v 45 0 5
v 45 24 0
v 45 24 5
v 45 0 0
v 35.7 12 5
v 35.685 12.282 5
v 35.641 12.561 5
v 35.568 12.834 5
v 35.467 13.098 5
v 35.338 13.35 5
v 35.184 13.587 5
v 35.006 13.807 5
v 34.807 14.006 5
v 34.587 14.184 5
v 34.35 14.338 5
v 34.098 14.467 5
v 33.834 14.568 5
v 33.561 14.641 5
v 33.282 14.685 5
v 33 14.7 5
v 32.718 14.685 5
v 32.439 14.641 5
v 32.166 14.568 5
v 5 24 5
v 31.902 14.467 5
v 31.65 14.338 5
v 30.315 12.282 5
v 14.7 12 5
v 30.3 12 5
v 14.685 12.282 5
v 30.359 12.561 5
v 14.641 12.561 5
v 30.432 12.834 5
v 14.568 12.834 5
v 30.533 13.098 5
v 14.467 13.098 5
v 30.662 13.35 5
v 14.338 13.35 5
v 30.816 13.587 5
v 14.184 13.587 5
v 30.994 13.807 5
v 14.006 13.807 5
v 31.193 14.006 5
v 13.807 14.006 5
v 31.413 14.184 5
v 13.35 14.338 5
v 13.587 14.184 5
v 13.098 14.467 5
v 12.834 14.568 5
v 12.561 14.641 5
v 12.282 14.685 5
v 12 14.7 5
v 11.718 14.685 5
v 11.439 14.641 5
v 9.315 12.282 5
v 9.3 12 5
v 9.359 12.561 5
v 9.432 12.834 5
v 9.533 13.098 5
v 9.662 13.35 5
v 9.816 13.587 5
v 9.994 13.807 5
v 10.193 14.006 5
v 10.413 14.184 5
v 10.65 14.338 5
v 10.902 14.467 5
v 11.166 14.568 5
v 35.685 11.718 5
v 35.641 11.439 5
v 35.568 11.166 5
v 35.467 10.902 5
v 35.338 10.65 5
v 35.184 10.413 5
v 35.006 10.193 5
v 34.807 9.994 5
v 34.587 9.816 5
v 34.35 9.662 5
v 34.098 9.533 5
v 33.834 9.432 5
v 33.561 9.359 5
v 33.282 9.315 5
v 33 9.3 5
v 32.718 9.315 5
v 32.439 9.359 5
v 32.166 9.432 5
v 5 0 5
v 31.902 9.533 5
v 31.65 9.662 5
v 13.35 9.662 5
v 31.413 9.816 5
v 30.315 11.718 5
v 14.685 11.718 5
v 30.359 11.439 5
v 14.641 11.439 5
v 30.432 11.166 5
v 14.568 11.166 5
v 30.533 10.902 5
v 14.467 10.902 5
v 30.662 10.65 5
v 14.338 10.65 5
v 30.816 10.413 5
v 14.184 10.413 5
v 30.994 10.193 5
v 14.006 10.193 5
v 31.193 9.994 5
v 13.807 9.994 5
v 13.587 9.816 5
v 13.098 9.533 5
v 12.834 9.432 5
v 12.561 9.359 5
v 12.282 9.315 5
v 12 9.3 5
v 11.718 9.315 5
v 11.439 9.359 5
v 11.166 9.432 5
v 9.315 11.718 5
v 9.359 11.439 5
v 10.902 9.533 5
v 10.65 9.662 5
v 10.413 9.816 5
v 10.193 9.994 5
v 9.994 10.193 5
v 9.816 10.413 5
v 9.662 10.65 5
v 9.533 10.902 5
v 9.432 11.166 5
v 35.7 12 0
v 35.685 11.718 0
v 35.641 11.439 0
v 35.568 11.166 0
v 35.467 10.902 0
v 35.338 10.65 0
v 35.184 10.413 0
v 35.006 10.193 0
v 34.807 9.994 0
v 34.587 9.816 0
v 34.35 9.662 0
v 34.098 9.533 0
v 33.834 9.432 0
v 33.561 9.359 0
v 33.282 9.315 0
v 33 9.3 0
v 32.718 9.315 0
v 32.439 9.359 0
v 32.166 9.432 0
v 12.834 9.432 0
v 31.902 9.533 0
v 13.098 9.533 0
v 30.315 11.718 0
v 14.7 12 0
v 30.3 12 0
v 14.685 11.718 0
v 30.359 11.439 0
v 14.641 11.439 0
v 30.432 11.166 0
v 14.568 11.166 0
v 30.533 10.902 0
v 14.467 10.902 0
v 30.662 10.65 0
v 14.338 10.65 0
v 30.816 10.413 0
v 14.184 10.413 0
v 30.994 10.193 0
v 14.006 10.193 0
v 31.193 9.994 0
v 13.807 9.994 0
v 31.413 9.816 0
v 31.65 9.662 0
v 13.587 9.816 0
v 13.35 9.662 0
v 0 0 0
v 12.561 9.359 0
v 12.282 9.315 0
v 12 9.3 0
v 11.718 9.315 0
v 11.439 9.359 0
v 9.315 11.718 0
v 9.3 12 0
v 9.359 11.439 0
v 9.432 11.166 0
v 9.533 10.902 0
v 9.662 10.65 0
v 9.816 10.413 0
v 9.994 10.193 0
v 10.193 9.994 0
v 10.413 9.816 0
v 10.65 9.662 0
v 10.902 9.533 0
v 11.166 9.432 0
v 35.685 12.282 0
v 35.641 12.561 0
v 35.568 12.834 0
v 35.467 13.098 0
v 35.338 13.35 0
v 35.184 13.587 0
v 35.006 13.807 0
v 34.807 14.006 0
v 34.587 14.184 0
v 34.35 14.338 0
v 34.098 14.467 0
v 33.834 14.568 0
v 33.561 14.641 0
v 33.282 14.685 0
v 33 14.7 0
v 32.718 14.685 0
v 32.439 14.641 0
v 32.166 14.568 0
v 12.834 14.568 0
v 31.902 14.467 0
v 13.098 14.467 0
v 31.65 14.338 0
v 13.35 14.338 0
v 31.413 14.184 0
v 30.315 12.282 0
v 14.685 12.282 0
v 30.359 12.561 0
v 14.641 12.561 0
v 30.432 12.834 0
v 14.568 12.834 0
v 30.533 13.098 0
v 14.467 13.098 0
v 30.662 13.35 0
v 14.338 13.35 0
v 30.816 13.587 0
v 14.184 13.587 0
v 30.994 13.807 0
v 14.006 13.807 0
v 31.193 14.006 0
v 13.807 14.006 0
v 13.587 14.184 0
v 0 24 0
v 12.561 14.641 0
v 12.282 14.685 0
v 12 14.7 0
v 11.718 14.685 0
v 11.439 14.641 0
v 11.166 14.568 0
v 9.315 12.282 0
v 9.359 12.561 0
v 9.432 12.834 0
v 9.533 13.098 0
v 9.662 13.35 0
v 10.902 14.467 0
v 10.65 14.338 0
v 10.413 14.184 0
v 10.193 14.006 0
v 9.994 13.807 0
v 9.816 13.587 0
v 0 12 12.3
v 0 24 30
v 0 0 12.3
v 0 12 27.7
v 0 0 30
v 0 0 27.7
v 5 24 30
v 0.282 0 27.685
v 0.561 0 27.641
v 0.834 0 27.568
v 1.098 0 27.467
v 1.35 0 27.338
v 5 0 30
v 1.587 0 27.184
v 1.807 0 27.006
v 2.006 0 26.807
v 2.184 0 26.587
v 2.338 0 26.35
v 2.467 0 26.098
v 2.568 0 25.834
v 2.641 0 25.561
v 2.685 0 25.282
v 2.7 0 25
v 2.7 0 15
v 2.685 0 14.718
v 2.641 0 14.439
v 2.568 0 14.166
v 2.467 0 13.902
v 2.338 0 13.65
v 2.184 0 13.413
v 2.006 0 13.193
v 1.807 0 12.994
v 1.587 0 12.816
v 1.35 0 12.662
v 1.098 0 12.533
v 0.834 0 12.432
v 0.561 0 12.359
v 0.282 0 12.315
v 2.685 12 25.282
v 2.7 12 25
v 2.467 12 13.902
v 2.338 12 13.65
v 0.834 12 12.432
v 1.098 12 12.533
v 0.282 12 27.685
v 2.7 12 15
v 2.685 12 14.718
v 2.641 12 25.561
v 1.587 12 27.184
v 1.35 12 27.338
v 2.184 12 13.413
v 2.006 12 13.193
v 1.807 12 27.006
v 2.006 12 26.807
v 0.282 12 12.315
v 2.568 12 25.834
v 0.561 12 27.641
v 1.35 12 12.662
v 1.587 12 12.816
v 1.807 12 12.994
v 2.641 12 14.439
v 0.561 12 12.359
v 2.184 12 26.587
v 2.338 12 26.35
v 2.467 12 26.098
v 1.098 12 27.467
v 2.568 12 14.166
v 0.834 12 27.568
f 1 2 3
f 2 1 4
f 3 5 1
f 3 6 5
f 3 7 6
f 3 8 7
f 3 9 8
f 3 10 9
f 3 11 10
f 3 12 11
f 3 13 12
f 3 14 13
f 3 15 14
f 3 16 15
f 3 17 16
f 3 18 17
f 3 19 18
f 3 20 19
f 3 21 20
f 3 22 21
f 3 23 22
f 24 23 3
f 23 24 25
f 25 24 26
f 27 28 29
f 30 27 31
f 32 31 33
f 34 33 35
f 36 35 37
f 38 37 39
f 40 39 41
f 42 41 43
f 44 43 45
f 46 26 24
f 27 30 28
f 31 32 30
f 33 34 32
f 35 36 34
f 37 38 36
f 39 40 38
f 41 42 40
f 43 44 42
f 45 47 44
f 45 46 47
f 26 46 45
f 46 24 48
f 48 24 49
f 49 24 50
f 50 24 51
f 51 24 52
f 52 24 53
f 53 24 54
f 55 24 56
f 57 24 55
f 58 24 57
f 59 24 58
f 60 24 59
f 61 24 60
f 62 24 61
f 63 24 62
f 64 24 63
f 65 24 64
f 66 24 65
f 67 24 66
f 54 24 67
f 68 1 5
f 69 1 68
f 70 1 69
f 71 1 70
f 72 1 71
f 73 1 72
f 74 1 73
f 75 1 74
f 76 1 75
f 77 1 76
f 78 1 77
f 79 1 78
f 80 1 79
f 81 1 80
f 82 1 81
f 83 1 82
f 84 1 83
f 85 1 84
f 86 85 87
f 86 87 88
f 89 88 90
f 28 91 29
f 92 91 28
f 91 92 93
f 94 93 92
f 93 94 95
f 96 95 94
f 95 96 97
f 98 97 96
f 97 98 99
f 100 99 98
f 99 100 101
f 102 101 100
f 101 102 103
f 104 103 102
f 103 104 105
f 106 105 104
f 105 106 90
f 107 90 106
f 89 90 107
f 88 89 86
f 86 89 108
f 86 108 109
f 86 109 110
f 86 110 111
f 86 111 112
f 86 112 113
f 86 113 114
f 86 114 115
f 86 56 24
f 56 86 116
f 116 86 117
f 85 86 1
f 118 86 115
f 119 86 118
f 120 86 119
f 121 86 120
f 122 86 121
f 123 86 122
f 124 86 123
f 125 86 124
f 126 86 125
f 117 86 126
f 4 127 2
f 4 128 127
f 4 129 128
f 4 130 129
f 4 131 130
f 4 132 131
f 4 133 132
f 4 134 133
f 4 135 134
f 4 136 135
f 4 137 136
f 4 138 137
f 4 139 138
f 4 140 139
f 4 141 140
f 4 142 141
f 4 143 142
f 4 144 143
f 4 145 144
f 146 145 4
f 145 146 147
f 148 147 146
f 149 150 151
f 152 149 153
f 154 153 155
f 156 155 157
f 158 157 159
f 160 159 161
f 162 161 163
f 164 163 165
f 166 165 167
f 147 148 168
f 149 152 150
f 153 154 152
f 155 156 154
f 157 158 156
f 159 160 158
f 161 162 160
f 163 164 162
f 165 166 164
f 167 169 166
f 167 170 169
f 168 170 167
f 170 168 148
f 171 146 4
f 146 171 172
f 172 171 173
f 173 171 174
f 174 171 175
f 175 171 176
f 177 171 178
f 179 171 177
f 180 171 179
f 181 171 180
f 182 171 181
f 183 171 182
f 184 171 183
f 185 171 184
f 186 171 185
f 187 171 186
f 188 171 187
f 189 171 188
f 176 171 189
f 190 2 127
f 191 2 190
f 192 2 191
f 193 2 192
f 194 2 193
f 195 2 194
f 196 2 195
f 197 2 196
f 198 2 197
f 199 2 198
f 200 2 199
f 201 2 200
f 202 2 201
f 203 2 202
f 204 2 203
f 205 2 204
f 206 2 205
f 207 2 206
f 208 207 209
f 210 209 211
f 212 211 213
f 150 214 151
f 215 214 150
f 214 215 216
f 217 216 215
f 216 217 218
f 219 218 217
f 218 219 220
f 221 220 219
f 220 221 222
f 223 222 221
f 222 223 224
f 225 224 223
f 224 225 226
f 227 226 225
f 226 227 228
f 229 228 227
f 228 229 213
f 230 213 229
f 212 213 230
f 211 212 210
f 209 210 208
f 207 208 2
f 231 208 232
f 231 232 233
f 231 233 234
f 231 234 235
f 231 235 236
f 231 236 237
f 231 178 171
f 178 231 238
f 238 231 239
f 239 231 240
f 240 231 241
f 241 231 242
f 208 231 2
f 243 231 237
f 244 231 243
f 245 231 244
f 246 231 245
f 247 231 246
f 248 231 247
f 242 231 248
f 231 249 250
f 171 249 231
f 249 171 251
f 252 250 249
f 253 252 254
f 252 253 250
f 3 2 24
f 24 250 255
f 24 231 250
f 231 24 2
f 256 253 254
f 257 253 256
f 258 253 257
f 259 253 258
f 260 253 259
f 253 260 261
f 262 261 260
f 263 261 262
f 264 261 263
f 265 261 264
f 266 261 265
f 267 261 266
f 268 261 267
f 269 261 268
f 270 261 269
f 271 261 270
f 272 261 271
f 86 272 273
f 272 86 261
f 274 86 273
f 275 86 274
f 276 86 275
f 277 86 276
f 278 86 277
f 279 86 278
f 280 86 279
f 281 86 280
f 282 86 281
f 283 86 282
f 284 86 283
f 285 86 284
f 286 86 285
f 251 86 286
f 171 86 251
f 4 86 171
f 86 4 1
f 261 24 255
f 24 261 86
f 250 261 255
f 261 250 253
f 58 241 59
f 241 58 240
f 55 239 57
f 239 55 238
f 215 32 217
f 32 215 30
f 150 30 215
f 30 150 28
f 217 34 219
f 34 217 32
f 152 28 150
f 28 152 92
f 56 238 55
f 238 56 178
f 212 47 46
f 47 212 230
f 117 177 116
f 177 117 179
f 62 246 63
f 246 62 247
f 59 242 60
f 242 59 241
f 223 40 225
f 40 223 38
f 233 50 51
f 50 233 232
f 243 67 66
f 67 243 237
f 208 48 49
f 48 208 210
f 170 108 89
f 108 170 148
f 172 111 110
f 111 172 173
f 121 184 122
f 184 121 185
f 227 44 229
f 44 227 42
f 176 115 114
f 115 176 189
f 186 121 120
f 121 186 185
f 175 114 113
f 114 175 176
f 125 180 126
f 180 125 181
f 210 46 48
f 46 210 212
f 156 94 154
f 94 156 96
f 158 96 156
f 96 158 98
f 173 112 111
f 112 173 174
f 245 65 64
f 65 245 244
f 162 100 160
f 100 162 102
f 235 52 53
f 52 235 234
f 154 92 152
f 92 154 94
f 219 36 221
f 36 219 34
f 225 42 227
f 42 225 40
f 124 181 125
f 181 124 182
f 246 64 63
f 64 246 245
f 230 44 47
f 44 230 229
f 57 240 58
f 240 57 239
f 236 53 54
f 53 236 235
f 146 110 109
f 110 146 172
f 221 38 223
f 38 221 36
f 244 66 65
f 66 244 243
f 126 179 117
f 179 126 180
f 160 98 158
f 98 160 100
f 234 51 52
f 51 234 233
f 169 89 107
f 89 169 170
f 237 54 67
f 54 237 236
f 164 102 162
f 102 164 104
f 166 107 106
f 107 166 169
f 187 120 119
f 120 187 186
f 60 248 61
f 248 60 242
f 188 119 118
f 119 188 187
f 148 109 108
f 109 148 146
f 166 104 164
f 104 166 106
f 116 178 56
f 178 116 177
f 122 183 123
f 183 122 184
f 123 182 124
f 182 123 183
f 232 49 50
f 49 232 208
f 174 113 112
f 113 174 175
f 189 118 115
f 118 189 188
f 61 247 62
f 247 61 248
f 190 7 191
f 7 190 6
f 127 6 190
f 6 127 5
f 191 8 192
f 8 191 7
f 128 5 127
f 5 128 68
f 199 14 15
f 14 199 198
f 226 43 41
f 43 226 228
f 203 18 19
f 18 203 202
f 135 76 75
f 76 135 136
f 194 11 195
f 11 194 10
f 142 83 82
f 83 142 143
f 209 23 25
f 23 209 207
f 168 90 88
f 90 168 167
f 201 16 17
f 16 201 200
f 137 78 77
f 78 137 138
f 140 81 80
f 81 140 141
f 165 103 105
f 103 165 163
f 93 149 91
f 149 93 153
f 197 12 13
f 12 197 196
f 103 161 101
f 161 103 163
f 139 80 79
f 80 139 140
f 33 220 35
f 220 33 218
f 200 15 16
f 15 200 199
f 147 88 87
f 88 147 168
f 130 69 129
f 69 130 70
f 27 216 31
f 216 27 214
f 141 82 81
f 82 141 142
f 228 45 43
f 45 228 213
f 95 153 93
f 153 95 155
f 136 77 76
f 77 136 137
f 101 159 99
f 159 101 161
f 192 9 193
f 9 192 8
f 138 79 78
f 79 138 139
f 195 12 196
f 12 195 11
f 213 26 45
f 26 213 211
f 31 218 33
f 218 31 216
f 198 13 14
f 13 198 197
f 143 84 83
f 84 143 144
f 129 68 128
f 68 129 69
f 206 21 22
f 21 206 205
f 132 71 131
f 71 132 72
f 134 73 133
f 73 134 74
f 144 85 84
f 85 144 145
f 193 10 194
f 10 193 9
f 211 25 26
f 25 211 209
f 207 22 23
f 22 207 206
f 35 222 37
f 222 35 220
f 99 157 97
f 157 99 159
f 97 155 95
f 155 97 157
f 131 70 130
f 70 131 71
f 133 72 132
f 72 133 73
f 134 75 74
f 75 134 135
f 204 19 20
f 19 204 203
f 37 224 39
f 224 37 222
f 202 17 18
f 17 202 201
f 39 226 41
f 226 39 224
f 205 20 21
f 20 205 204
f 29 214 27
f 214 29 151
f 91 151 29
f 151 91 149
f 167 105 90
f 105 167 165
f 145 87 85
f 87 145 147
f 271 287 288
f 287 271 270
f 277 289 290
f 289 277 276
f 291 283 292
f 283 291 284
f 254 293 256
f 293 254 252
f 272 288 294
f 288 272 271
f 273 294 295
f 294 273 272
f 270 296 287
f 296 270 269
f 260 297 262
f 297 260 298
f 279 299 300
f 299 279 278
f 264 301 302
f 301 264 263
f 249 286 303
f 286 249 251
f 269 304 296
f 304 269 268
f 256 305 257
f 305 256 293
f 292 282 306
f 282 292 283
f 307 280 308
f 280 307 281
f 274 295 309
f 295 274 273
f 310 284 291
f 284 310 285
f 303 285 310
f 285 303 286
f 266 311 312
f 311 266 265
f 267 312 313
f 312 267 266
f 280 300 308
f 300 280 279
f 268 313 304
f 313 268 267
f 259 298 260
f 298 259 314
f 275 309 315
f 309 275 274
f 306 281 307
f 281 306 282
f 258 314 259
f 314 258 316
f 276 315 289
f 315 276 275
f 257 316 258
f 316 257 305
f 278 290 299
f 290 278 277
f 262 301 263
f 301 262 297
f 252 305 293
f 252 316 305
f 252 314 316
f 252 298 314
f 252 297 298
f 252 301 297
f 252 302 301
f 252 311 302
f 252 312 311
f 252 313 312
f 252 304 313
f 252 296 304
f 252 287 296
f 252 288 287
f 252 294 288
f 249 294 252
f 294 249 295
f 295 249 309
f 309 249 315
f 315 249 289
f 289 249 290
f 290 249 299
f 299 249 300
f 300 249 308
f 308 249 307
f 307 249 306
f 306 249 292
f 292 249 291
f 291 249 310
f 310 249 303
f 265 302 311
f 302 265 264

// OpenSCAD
// Adjustable L bracket with upright slot.
$fn = 60;
eps = 0.02;
base_l = 45;
upright_h = 30;
width = 24;
thickness = 5;
slot_l = 10;
module vertical_slot() { hull() { translate([0,width/2,thickness+upright_h/2-slot_l/2]) rotate([90,0,0]) cylinder(d=5.4,h=width+2*eps); translate([0,width/2,thickness+upright_h/2+slot_l/2]) rotate([90,0,0]) cylinder(d=5.4,h=width+2*eps); } }
difference() {
    union() { cube([base_l,width,thickness]); cube([thickness,width,upright_h]); }
    for(x=[12,base_l-12]) translate([x,width/2,-eps]) cylinder(d=5.4,h=thickness+2*eps);
    vertical_slot();
}
